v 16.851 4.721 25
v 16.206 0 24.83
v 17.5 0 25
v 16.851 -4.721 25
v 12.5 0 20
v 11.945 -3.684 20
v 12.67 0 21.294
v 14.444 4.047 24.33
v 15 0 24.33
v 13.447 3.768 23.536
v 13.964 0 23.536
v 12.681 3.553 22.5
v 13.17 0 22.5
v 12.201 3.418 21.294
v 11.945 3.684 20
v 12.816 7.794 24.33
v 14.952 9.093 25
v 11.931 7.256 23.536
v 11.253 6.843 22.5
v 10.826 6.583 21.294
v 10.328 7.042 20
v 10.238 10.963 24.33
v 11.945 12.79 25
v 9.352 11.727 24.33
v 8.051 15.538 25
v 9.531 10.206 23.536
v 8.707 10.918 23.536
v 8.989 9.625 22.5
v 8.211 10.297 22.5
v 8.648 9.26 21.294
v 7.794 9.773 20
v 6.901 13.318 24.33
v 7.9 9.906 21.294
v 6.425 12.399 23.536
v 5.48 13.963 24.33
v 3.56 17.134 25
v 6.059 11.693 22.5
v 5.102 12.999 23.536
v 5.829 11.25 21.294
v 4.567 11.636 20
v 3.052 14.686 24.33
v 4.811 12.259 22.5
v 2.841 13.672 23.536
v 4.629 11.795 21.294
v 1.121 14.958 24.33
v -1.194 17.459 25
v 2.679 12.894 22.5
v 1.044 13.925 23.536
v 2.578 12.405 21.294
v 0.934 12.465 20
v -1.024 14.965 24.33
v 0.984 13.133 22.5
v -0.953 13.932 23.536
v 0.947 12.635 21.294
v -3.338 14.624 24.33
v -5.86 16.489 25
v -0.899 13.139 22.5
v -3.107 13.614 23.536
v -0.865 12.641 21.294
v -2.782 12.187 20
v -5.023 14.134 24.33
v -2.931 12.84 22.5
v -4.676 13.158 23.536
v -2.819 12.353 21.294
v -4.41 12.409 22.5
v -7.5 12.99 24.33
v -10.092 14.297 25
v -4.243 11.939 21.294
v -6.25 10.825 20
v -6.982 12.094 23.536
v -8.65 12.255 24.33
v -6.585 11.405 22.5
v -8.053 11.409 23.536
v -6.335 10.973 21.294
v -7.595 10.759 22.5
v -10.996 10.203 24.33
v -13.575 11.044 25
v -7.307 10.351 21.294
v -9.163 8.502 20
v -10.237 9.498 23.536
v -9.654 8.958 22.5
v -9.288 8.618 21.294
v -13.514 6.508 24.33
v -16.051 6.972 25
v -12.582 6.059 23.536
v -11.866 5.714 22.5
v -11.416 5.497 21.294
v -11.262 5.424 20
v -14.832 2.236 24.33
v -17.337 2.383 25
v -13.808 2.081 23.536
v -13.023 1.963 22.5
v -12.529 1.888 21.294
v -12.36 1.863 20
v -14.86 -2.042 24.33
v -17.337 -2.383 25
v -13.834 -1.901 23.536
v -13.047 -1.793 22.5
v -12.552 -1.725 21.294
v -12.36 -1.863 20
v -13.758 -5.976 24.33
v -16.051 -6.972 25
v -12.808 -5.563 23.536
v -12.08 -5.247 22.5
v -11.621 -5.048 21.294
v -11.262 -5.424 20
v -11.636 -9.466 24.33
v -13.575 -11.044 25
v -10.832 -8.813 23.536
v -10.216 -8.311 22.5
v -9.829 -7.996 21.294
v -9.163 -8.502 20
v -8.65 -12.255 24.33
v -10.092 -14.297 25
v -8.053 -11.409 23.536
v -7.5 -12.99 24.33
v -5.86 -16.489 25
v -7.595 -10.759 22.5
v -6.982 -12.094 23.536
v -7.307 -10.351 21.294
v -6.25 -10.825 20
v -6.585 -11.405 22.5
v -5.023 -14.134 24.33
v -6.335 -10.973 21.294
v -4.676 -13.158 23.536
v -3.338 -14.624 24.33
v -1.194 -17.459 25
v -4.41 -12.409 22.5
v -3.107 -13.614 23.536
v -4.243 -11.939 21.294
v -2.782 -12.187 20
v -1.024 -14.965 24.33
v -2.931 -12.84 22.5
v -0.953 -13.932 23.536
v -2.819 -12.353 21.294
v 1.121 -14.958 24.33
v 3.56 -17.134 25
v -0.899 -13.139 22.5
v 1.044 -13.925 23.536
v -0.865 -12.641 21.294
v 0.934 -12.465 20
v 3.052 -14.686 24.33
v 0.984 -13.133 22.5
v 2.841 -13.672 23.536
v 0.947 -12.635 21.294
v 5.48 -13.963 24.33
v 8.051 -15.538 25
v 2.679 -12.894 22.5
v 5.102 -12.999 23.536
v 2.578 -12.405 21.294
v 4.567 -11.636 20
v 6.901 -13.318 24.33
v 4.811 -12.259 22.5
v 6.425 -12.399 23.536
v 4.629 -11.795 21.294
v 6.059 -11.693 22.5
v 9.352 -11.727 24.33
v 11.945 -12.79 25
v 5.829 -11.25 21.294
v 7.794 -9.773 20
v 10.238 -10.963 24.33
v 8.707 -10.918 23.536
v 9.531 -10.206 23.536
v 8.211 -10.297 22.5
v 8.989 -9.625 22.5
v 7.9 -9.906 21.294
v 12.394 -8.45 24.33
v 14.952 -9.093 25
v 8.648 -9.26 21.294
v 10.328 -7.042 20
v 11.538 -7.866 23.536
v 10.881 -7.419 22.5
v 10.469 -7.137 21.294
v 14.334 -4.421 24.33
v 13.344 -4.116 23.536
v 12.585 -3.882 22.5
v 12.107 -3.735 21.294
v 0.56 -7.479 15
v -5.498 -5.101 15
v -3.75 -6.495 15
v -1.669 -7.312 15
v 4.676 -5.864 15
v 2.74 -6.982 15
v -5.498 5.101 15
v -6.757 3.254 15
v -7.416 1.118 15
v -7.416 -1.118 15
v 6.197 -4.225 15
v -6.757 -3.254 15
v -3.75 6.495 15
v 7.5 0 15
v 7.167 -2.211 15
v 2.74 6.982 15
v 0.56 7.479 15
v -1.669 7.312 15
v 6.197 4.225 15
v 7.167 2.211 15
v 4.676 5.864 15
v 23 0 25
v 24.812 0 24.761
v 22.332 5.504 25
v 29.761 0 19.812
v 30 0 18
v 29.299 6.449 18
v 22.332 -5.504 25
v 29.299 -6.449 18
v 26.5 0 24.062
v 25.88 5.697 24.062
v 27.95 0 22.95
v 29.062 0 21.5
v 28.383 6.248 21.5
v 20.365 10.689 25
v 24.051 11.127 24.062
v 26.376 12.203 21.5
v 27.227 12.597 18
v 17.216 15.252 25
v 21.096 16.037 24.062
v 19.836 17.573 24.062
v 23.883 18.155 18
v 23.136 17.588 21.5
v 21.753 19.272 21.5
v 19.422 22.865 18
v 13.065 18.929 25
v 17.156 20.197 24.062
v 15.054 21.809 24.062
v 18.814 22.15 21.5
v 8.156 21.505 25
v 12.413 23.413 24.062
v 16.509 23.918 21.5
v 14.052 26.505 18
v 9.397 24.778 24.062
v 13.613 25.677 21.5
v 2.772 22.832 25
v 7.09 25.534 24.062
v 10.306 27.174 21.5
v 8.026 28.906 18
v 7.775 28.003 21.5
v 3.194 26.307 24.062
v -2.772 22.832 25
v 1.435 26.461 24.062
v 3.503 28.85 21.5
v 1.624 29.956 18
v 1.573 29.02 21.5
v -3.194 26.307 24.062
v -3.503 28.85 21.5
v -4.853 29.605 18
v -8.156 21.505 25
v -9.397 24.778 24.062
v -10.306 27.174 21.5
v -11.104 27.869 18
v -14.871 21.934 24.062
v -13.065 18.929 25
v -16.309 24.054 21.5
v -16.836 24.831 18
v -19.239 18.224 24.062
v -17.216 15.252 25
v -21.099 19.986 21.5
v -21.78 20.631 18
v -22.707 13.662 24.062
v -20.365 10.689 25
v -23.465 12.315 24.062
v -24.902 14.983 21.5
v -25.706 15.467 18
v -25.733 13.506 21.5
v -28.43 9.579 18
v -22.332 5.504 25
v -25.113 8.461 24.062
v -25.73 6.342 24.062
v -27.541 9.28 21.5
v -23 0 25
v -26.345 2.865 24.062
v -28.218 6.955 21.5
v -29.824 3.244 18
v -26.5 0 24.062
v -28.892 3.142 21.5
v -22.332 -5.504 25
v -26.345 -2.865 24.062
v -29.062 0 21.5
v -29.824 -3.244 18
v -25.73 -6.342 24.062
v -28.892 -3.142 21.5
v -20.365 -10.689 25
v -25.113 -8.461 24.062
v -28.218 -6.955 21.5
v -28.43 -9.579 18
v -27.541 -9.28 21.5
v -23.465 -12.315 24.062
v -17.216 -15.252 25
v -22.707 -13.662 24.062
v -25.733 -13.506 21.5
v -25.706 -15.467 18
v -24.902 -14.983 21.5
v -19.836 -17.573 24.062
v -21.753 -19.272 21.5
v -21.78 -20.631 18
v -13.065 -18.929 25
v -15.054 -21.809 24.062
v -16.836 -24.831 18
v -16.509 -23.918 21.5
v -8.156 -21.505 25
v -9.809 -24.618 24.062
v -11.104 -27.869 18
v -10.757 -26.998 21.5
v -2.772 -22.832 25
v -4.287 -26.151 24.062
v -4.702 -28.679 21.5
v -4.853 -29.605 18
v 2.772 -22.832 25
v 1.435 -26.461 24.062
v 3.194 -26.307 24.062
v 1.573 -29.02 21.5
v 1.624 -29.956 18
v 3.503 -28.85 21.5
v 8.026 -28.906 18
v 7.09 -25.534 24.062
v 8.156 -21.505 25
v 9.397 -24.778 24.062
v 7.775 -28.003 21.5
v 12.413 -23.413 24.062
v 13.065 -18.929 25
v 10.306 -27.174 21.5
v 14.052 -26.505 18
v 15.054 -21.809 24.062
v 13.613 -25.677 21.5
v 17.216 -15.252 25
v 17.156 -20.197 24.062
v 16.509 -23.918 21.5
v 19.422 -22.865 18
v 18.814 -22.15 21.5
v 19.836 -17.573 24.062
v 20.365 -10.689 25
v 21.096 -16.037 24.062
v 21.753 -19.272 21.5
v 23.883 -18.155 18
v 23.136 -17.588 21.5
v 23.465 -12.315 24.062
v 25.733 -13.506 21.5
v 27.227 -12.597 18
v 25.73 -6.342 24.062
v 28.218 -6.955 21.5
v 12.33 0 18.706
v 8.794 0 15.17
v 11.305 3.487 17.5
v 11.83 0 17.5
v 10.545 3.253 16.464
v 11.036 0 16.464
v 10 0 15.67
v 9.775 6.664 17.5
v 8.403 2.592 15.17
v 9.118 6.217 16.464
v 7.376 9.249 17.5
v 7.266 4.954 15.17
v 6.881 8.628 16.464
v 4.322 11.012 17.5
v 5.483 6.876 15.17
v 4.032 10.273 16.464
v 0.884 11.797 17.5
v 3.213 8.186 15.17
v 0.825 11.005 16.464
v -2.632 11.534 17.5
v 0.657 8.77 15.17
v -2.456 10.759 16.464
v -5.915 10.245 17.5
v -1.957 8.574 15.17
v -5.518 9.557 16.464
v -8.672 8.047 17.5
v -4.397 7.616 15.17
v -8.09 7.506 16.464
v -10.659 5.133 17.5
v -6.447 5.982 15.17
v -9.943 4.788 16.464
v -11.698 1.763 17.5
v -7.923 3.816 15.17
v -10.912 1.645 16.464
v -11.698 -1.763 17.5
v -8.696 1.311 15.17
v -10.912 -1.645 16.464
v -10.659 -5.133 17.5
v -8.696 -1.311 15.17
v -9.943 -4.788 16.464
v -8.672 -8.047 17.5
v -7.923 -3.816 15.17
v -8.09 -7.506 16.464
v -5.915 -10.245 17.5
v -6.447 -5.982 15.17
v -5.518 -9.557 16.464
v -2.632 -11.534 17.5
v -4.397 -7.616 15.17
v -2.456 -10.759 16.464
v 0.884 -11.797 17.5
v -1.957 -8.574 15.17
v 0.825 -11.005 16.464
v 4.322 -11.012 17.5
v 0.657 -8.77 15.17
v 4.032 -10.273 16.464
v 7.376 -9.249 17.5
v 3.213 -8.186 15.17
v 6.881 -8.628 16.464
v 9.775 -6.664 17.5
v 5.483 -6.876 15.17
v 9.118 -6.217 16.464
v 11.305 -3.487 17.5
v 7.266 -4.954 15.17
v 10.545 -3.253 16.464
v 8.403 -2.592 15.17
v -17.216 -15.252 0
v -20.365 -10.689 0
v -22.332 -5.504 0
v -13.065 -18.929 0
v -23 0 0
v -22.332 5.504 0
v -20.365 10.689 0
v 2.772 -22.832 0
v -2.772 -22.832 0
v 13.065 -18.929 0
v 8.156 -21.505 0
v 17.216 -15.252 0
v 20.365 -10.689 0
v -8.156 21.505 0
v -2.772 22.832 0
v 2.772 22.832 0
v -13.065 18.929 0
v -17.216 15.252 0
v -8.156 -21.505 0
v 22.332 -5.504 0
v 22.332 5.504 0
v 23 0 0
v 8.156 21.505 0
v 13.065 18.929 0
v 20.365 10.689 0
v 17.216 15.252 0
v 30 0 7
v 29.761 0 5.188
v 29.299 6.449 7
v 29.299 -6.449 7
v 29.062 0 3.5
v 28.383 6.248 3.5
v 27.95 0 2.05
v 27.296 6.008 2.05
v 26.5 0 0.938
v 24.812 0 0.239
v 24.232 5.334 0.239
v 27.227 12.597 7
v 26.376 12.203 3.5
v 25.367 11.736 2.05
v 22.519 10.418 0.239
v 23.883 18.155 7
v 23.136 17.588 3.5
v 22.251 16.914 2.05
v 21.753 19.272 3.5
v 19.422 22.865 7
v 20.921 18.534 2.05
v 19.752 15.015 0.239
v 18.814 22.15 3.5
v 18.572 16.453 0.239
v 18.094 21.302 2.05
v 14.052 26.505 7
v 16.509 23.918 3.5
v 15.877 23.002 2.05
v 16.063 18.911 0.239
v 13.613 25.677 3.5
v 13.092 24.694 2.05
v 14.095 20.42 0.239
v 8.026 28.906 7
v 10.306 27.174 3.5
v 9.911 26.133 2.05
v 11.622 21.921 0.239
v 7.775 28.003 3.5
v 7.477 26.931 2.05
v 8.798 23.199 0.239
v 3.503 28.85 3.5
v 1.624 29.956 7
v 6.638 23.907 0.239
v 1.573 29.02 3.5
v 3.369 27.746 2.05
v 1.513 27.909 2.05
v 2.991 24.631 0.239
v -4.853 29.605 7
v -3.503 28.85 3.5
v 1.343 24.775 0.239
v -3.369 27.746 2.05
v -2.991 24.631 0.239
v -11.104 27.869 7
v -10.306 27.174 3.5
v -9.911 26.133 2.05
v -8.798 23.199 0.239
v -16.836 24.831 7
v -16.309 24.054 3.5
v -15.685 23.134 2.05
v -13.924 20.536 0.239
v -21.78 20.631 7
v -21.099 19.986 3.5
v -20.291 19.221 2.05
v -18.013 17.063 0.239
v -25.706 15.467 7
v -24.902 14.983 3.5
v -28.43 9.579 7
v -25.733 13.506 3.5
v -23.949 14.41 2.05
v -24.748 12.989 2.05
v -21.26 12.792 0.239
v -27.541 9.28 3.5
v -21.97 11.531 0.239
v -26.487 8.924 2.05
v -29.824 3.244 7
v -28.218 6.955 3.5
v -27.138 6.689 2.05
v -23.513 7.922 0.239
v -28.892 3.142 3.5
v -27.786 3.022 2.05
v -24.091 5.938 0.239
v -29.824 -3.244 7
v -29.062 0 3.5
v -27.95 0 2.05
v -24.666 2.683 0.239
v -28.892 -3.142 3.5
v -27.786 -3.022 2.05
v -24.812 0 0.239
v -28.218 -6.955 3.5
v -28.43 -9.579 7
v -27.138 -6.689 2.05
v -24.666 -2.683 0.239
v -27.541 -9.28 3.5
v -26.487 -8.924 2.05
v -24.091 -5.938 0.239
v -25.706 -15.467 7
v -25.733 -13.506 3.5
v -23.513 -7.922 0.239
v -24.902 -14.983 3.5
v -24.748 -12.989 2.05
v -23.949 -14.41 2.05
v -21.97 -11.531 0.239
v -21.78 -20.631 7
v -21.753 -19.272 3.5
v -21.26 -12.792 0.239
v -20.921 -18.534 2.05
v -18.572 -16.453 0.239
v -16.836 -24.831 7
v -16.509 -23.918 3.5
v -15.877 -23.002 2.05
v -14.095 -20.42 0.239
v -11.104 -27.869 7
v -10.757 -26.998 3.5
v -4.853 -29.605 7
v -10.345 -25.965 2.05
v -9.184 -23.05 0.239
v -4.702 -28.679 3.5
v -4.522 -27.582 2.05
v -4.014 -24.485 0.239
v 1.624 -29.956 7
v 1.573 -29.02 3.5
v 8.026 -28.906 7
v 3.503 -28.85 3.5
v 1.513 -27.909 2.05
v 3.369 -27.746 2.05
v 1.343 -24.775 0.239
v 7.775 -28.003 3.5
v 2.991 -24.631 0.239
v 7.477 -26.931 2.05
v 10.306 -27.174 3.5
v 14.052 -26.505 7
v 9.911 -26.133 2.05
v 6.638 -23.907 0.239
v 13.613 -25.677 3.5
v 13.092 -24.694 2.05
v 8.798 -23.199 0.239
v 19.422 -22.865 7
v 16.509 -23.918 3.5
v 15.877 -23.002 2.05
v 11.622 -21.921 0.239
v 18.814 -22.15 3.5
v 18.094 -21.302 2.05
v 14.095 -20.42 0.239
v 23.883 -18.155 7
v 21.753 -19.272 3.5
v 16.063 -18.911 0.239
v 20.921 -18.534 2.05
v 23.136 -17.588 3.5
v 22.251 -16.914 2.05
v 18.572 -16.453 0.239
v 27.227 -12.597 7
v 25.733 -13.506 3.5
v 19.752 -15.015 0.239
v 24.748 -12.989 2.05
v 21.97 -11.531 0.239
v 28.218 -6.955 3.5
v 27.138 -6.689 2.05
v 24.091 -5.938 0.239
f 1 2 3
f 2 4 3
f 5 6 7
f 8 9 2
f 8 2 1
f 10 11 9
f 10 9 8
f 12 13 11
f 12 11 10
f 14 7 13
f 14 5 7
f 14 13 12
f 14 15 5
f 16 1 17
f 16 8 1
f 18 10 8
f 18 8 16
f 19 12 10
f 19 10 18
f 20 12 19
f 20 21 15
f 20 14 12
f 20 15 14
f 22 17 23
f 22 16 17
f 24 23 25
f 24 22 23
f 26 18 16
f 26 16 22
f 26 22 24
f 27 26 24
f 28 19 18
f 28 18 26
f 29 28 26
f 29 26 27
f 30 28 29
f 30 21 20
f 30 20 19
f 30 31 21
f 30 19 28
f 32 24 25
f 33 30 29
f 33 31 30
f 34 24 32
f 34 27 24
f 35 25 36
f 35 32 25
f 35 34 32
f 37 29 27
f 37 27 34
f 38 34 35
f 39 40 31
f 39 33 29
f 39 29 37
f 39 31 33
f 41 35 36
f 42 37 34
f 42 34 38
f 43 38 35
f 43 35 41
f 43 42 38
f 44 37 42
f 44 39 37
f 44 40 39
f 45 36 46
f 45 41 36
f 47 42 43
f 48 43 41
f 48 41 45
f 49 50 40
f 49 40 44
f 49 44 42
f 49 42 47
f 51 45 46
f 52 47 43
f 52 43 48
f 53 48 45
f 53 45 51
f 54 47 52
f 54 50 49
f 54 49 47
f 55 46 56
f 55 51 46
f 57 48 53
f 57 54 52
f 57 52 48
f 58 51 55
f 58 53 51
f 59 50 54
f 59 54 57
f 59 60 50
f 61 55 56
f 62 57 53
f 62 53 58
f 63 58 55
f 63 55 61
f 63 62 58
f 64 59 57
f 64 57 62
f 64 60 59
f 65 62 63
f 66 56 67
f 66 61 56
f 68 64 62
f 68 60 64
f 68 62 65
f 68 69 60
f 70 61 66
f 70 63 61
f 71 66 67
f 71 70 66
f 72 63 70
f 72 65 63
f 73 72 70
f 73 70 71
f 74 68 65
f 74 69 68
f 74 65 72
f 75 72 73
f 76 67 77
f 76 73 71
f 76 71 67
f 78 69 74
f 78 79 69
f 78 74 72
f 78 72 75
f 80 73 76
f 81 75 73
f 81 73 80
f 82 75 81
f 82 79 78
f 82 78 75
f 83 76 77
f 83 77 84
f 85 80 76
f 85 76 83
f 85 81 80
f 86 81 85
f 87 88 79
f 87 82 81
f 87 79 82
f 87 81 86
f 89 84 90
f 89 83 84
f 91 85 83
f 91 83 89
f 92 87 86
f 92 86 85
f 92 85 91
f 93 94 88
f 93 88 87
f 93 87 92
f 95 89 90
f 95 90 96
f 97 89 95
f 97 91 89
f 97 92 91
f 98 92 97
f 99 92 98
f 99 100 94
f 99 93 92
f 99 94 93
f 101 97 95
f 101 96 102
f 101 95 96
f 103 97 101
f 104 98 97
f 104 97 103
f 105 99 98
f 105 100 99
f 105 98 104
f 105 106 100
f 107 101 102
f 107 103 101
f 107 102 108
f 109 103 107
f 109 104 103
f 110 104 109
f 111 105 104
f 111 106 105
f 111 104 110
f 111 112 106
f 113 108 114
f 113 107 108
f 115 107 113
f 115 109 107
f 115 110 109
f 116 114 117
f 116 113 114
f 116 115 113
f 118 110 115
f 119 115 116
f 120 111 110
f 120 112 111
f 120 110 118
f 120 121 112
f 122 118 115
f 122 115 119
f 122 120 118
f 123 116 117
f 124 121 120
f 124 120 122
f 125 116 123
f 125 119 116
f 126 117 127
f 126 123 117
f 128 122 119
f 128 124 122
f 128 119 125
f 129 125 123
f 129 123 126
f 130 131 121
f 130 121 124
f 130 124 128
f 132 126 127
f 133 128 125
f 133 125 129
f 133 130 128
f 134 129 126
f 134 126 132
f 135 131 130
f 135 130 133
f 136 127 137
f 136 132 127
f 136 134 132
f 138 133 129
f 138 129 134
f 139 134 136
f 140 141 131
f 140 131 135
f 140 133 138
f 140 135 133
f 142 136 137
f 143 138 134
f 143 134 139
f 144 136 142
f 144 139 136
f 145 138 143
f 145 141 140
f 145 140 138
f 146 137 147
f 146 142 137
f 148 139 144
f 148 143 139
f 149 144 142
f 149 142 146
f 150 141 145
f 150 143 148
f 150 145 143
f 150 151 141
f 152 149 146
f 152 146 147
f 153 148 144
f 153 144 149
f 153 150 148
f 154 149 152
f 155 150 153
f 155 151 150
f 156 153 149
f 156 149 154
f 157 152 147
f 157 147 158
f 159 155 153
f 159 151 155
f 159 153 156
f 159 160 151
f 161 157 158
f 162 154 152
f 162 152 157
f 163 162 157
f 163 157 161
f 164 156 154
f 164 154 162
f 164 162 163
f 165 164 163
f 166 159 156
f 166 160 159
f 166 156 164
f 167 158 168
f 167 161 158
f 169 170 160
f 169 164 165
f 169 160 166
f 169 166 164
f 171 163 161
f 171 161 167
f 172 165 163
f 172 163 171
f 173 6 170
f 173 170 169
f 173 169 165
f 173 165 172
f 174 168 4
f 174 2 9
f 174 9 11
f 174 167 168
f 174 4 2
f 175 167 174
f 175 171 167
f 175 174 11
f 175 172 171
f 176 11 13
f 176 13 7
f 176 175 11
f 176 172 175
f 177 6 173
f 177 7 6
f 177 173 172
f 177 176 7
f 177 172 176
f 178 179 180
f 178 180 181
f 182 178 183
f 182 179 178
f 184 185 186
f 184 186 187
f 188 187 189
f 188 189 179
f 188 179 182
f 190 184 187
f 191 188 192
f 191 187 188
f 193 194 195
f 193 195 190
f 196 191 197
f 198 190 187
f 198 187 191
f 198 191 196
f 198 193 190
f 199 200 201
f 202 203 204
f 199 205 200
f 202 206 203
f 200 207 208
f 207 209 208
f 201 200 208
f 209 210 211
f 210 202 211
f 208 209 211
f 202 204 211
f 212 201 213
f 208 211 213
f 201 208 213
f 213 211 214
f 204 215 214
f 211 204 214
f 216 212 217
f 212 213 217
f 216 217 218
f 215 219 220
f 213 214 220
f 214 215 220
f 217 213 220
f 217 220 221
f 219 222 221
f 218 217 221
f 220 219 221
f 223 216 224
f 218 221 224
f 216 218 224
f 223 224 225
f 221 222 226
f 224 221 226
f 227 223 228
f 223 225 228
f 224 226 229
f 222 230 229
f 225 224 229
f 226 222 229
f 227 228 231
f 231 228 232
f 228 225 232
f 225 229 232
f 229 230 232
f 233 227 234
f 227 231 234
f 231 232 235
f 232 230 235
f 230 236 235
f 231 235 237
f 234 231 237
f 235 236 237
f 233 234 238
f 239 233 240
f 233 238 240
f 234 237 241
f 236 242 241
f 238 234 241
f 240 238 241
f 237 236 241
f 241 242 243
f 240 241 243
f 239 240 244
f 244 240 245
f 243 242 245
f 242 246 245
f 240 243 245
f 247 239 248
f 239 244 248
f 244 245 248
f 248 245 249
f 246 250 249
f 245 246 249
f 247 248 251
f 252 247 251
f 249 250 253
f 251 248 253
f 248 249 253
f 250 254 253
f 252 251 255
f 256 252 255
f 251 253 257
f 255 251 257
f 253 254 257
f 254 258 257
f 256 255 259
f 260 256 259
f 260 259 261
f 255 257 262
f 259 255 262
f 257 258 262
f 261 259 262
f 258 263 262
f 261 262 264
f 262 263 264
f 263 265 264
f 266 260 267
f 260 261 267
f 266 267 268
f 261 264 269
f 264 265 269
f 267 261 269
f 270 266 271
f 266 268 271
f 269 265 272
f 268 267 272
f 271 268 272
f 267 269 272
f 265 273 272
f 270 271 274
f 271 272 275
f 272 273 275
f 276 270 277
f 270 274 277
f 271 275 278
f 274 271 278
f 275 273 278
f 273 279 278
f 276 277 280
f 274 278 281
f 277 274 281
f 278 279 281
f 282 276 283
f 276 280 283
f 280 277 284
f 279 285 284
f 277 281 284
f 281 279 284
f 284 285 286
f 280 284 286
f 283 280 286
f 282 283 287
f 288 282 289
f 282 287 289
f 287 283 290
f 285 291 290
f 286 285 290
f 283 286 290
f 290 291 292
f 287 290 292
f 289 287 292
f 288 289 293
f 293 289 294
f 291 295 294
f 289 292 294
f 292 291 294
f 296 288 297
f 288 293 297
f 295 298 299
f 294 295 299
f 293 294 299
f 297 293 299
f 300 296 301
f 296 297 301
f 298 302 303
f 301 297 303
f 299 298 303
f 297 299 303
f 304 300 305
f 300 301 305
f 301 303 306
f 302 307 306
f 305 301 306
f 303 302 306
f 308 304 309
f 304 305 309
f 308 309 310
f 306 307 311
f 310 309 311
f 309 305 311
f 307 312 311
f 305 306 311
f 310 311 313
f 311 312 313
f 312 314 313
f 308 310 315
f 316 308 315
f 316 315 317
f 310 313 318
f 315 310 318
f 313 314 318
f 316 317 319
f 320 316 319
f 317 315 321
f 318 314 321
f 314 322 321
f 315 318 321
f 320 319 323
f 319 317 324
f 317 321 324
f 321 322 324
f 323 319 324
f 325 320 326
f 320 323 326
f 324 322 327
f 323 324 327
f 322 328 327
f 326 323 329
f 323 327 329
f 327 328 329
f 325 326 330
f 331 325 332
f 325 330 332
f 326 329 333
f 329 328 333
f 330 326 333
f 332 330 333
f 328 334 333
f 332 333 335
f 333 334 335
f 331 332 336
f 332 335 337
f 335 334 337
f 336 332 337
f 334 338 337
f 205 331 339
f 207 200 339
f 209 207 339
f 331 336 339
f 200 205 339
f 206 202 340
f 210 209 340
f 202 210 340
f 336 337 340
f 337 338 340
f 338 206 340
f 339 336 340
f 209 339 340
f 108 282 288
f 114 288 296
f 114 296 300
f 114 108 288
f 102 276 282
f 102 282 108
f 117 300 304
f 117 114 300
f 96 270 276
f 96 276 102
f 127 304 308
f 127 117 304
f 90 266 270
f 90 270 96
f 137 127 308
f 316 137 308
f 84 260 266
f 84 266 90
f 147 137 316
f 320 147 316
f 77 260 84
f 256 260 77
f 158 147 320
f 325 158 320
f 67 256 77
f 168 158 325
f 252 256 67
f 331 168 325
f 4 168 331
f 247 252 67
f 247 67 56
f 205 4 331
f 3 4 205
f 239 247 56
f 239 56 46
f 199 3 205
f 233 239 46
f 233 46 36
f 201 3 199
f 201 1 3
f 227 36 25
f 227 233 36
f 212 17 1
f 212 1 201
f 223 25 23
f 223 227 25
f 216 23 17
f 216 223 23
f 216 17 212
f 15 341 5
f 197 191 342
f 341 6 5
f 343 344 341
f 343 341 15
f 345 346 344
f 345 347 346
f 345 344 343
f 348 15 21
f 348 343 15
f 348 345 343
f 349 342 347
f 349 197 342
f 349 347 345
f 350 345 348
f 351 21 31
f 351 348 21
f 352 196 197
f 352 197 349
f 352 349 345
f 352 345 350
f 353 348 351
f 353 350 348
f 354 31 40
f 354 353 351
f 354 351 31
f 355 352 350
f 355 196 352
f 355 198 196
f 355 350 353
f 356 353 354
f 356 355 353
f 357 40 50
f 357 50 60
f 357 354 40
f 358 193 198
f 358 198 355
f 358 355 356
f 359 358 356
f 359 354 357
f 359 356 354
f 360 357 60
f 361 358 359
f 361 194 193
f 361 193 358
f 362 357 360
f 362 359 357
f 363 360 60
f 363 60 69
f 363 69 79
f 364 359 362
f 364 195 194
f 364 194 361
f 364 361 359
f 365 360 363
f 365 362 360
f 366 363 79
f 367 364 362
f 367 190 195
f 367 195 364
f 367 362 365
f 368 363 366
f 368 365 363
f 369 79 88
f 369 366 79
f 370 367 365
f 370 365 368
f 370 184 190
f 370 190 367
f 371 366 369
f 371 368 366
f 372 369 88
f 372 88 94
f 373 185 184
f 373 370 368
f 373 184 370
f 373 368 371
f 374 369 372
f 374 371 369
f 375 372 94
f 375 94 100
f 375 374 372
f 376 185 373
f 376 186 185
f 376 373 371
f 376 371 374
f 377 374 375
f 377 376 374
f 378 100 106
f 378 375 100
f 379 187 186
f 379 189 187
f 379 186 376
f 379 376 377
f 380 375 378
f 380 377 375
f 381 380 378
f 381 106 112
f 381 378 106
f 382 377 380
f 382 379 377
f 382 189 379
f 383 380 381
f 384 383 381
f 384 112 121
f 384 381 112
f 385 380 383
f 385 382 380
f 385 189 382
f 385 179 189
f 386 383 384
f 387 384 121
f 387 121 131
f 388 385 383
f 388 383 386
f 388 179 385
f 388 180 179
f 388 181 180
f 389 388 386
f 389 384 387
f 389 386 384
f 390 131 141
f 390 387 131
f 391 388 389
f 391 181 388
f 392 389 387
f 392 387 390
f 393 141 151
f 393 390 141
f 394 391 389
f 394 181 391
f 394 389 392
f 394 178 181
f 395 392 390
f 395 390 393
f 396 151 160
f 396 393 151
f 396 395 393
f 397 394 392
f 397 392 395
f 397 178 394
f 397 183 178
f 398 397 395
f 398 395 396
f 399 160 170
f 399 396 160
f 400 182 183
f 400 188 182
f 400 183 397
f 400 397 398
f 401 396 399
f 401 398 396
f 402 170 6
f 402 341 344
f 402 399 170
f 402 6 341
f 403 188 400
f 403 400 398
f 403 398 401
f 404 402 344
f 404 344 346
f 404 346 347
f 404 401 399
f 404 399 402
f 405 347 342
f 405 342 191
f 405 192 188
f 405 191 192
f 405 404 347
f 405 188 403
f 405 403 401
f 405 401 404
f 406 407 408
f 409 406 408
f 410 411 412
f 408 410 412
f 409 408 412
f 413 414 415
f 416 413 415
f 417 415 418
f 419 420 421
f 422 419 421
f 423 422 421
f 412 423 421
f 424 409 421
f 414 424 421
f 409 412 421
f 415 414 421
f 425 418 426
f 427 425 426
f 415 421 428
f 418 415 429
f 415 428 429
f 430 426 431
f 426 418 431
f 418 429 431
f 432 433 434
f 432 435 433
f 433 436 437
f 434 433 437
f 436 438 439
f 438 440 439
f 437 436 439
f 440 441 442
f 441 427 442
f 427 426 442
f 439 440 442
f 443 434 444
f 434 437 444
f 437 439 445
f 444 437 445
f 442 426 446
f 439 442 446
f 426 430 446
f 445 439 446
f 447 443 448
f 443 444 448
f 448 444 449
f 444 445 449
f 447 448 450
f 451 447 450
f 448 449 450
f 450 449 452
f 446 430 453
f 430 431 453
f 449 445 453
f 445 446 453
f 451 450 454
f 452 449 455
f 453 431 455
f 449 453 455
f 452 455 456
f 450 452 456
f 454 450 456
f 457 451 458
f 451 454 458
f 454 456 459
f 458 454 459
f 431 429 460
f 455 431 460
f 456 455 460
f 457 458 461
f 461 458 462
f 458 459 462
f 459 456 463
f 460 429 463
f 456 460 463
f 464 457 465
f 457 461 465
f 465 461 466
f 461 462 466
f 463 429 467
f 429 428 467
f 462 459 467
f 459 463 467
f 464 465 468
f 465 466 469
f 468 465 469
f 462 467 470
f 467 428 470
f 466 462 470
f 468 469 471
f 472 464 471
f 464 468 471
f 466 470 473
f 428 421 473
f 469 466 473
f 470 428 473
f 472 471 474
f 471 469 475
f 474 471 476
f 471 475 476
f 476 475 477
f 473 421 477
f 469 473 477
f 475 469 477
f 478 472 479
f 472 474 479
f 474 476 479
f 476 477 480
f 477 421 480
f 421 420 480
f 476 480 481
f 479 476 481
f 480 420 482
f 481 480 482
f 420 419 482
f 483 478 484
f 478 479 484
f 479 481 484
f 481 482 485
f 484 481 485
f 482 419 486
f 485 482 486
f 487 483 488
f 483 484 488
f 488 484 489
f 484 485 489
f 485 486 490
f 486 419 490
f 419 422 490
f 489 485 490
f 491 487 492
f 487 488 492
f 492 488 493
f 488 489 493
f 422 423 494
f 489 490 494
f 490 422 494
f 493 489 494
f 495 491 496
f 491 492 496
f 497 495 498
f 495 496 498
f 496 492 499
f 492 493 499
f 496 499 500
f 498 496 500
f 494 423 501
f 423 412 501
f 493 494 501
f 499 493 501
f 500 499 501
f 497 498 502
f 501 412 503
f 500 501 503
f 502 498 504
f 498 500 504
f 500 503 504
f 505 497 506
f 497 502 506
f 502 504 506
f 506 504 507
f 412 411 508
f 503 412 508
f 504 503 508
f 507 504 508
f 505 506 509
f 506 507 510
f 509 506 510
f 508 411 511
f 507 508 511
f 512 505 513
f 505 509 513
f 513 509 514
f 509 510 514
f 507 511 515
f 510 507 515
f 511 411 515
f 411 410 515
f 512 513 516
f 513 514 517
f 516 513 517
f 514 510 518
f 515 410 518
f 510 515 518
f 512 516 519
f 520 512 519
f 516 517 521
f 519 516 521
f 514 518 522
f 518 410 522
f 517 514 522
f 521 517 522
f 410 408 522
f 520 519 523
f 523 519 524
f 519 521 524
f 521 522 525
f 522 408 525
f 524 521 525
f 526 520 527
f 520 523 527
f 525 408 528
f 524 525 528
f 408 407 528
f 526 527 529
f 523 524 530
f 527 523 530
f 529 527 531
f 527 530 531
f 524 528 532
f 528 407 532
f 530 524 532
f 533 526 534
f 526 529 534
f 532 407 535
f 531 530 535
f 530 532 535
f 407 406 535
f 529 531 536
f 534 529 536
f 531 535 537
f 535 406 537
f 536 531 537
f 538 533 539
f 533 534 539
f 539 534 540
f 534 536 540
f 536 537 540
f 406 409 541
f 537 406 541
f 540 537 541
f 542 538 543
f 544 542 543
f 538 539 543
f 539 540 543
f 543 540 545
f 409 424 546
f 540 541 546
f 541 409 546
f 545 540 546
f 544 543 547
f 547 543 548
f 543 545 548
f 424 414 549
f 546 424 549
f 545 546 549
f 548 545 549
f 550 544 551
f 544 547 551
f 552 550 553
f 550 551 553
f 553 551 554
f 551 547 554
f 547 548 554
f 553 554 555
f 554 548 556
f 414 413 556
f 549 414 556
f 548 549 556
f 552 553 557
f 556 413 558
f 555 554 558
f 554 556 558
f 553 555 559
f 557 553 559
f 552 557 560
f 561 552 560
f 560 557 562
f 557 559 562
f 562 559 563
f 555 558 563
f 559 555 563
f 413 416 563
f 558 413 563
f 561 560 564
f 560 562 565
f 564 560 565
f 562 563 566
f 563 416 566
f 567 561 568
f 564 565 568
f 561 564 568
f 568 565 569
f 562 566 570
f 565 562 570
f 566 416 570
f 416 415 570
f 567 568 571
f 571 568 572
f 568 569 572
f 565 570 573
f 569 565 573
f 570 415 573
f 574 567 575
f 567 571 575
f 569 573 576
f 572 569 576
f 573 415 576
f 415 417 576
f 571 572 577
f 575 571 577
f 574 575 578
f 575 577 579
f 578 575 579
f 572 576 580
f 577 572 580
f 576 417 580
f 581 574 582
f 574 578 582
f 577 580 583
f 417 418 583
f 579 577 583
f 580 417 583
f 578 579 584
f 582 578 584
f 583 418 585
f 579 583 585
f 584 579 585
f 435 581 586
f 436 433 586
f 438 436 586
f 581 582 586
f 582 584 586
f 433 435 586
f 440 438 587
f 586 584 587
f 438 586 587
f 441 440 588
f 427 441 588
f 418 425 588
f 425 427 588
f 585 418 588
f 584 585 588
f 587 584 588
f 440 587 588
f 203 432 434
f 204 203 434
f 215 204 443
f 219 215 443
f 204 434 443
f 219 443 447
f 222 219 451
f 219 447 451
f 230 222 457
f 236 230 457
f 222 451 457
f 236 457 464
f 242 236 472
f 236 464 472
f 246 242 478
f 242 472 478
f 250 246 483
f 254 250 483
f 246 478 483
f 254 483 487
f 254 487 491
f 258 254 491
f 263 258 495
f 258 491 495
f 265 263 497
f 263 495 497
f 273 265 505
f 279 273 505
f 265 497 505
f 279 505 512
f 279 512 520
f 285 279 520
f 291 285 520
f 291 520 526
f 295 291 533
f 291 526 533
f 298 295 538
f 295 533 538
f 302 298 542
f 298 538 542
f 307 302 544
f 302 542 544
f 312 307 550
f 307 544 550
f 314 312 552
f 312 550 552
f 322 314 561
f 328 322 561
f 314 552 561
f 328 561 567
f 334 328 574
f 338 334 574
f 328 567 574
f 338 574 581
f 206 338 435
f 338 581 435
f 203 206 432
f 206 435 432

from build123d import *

# Parameters (mm, degrees)
SKETCH1_R           = 30
BOSS_EXTRUDE1_DEPTH = 25
SKETCH2_R           = 12.5
CUT_EXTRUDE1_DEPTH  = 10
FILLET1_R           = 5
FILLET2_R           = 7


with BuildPart() as part:
    # Sketch1 → Boss-Extrude1 (new body)
    with BuildSketch(Plane.XY):
        Circle(SKETCH1_R)
    extrude(amount=BOSS_EXTRUDE1_DEPTH)

    # Sketch2 → Cut-Extrude1 (cut)
    with BuildSketch(Plane.XY.offset(25)):
        Circle(SKETCH2_R)
    extrude(amount=-CUT_EXTRUDE1_DEPTH, mode=Mode.SUBTRACT)

    # Fillet1
    fillet1_edges = [part.edges().sort_by_distance(p)[0] for p in [
        (-12.5, 0, 15),
        (-12.5, 0, 25),
    ]]
    fillet(fillet1_edges, radius=FILLET1_R - 0.0001)  # a hair under: the kernel refuses the full size

    # Fillet2
    fillet2_edges = [part.edges().sort_by_distance(p)[0] for p in [
        (-30, 0, 0),
        (-30, 0, 25),
    ]]
    fillet(fillet2_edges, radius=FILLET2_R)


solid = part.part
